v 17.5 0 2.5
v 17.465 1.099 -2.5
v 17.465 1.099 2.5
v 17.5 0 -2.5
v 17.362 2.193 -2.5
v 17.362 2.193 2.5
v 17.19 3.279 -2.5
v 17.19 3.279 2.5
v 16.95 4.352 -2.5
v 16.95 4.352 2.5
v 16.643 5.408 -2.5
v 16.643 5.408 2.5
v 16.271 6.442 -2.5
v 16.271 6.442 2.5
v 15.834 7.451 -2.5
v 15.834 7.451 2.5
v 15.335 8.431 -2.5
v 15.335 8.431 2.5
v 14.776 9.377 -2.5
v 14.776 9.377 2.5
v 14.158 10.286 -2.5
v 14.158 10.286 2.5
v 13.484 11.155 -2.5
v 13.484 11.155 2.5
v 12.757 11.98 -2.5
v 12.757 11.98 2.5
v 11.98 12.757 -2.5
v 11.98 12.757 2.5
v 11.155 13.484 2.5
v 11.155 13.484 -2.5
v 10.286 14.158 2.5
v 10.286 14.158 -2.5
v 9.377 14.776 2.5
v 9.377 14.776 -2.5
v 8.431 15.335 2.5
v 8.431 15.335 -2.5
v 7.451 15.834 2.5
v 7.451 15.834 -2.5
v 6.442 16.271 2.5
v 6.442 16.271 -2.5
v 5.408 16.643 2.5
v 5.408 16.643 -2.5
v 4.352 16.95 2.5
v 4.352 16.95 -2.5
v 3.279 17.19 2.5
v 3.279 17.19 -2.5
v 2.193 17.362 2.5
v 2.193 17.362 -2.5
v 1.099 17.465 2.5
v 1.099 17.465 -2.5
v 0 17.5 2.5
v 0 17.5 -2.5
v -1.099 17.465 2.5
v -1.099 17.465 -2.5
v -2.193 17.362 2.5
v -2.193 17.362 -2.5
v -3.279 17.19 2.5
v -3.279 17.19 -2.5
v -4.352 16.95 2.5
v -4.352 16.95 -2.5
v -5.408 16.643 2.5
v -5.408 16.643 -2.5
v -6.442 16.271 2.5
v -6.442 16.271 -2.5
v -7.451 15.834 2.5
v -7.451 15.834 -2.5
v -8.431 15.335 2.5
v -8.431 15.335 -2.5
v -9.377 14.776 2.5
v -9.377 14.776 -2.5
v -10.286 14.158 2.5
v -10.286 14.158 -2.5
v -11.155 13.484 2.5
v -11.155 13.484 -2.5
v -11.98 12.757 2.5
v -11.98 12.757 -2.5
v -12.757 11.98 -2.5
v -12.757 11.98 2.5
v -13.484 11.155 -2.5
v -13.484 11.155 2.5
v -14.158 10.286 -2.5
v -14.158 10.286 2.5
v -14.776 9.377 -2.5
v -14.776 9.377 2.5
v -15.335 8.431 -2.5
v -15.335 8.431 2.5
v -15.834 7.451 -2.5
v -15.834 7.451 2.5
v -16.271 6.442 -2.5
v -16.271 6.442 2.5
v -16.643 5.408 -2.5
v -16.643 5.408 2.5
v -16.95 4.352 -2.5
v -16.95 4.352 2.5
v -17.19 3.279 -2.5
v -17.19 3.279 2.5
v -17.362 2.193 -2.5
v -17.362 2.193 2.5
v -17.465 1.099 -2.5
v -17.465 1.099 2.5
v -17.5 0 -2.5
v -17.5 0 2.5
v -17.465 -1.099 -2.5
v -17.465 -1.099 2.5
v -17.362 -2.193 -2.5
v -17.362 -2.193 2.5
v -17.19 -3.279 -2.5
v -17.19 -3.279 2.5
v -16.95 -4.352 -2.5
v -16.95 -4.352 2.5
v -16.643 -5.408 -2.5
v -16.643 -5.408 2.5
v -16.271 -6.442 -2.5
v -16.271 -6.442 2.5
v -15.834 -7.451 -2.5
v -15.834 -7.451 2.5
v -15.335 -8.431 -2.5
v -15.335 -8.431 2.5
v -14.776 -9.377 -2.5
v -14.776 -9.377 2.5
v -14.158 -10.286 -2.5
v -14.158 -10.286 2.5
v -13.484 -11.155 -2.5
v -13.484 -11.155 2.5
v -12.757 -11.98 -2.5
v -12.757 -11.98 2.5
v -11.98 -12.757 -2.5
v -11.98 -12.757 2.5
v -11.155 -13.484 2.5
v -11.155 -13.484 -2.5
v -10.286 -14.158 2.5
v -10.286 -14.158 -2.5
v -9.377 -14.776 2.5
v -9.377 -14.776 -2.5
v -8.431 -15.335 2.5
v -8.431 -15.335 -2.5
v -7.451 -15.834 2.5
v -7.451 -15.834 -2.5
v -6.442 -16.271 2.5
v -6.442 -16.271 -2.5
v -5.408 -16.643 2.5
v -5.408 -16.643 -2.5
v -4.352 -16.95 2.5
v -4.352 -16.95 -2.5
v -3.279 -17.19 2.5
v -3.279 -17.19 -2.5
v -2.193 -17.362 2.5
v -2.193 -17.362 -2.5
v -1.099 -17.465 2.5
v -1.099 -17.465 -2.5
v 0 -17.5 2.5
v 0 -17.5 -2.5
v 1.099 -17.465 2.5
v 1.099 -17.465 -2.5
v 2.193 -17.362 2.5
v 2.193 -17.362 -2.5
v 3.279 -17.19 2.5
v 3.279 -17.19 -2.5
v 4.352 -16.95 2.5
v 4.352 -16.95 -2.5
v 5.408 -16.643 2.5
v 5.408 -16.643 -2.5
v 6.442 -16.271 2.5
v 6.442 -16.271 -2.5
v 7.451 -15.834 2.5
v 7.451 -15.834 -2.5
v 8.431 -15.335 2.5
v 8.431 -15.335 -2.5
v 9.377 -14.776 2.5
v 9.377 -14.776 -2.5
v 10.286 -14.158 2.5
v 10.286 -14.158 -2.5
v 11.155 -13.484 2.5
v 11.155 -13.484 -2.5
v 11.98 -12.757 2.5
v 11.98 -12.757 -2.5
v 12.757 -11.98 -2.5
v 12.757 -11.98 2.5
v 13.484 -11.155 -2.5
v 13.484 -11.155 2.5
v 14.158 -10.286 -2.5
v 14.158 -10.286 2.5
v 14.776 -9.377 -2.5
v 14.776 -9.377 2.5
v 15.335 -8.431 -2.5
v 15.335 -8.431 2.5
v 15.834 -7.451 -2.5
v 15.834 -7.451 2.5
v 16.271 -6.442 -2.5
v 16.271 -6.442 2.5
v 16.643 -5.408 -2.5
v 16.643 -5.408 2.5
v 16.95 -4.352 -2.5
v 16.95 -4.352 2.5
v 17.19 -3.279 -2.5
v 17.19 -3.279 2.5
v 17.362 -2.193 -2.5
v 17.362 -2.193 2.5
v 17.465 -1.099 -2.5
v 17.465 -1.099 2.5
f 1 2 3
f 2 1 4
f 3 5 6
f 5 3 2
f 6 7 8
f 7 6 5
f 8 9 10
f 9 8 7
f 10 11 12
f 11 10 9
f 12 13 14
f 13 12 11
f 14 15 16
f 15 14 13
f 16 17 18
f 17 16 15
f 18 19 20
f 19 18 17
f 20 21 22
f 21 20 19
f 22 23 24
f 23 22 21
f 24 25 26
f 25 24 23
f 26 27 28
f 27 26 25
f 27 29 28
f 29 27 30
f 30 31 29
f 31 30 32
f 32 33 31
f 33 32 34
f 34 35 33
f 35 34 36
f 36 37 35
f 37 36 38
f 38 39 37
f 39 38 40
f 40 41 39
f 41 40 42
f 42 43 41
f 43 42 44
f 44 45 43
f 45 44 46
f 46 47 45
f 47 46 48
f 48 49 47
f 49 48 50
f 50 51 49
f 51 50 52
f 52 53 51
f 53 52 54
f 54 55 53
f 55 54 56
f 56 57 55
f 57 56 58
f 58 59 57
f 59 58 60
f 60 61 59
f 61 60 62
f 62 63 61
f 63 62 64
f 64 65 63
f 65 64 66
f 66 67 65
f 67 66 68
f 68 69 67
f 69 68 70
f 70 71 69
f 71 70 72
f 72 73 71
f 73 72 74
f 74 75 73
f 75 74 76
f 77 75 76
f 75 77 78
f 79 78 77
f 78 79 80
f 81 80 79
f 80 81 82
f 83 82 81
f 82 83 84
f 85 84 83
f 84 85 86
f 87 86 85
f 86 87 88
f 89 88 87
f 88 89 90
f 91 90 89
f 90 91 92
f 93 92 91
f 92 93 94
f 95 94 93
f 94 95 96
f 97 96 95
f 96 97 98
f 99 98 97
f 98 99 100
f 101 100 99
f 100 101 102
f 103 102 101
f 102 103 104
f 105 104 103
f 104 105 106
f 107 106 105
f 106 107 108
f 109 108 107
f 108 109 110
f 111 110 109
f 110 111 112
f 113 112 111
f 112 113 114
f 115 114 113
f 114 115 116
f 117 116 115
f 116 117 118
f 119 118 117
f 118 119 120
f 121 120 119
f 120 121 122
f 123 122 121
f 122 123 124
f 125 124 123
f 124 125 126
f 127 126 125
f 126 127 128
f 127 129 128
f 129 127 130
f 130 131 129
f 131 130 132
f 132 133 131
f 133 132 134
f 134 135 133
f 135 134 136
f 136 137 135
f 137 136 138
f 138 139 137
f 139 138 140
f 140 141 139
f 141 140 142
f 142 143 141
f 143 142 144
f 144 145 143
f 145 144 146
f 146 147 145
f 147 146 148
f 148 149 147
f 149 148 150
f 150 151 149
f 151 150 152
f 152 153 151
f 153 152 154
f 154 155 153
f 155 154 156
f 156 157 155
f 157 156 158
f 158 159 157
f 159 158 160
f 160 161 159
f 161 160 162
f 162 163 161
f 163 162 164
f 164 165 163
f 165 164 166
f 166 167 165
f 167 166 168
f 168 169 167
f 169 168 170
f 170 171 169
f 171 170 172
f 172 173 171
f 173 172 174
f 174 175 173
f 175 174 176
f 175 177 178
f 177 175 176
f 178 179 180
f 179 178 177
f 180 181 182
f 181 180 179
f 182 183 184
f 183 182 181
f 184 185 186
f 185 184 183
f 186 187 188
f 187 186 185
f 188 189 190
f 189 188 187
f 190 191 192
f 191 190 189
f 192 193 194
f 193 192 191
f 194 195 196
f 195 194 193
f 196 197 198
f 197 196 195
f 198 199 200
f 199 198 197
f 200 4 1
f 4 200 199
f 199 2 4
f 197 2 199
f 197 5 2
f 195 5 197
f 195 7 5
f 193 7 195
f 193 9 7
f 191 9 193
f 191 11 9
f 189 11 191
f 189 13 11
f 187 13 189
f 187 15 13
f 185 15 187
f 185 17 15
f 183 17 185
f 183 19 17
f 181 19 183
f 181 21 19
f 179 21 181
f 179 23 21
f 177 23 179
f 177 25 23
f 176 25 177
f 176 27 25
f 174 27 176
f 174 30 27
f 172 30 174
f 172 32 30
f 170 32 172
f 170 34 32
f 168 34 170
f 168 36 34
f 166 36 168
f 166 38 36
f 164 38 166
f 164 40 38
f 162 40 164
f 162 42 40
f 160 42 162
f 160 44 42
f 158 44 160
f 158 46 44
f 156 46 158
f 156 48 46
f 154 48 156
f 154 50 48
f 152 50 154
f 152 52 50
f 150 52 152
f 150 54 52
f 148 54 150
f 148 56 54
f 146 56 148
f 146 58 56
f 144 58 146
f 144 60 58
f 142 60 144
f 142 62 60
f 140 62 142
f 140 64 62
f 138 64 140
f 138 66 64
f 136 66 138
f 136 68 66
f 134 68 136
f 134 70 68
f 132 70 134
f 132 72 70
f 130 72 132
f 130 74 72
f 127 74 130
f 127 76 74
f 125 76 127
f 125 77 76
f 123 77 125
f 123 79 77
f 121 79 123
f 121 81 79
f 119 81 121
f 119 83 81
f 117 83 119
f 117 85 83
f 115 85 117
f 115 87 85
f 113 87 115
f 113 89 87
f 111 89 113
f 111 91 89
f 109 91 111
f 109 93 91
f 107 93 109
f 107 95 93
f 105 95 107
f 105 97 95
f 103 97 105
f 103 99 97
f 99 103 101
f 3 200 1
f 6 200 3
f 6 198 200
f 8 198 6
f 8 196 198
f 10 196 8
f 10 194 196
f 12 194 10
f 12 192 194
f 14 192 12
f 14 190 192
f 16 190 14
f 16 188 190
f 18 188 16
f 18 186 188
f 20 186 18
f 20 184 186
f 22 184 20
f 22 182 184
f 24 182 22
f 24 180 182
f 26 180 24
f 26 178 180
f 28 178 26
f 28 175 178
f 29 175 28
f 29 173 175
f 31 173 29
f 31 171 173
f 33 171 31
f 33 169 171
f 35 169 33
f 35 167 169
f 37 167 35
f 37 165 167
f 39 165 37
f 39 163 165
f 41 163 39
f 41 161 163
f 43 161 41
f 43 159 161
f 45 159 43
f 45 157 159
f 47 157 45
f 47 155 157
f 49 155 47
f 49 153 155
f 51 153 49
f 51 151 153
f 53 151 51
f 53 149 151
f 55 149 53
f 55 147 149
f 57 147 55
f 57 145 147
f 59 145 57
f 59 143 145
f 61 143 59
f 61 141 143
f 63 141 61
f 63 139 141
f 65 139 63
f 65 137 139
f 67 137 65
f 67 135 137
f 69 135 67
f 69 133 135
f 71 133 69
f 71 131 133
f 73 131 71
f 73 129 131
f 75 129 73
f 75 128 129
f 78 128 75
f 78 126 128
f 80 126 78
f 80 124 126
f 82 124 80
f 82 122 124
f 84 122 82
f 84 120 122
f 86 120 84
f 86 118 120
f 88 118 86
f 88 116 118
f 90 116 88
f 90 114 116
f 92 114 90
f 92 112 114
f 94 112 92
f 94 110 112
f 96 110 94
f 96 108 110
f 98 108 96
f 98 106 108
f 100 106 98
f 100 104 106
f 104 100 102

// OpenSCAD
// file: 3dprinter.scad
//BioDeploy SCAD file = 3dprinter.scad


//choose the max specs for your 3d printer
//here we use a replicator2x specs

x_print_max = 25*10;
y_print_max = 15.2*10;
z_print_max = 15.5*10;

//don't forget *10 to put in centimeters
// file: generator_variables.scad
//===============================================//
//===============================================//
// BioDeploy SCAD file = generator_variables.scad//
//                 Start File                    //
//===============================================//
//===============================================//
//-----------------------------------------------//
include <3dprinter.scad>
//===============================================//
//                   variables                   //
//===============================================//
//===============================================//
pad = 0.1; //padding
//choose the spec for your generator
//===============================================//
//                    magnets1                   //
//===============================================//
//Volume :
x_magnet = 5.5;
y_magnet = 21.5;
z_magnet = 21.5;
//Number of magnets on the rotor :
nbmagnetsonrotor = 16;
rotor_ext_max = 60;
//===============================================//
//                    magnets2                   //
//===============================================//
//Volume :
diam_magnet2 = 35;
z_magnet2 = 5;
//Number of magnets on the rotor :
nbmagnetsonrotor2 = 6;
//===============================================//
//                      rotor                    //
//===============================================//
smooth_rotor = 100;
smooth_bobine = 100;
z_rotor_int = 20;
//===============================================//
//                  adapter_rotor                //
//===============================================//
diam_adapter_max = 32 ;
diam_adapter_min = 25.15 ;
h_adapter = 7;
h_adapter_box = 12;
nbarm = 6;
//===============================================//
//                    Bobine1                    //
//===============================================//
r_bobine_ext_max = y_magnet/2;
r_bobine_ext_min = 4.5;
r_bobine_int = 3.5;

x_bobine = 30;
p_bobine_ext = 1;

r_bobine2_ext_min = 3.4;
r_bobine2_int = 2.5;

wire_in = 1;
wire_out = 1;


//===============================================//
//                    Protector                  //
//===============================================//

r_bobine_protector_ext_max = y_magnet/2 + 1.5;
gap_bobine_protector = (r_bobine_protector_ext_max - r_bobine_ext_max)/2;


x_bobine_protector=x_bobine+1.5;

smooth_protector = 100;

//===============================================//
//                    Socle1                     //
//===============================================//

r_socle_int = 0;
r_socle_ext = 0;
position_bobine_in = 0;
position_bobine_out = 0;
connector_socle_female =0;
connector_socle_male =0;
space_marge=3;

//-----------------------------------------------//
//===============================================//
//===============================================//
// BioDeploy SCAD file = generator_variables.scad//
//                   End  File                   //
//===============================================//
//===============================================//
// main file
//===============================================//
//===============================================//
//  BioDeploy SCAD file = generator_magnet2.scad  //
//                 Start File                    //
//===============================================//
//===============================================//
//-----------------------------------------------//

//===============================================//
//                   variables                   //
//===============================================//
include <generator_variables.scad>
//===============================================//
//               Calls for use                   //
//===============================================//
//use <generator_logo.scad>
//===============================================//
//                    Trees                      //
//===============================================//
module magnet2()
{color("Rose",1)cylinder(z_magnet2,diam_magnet2/2,diam_magnet2/2,$fn=smooth_rotor, center=true);}
magnet2();

//%cube([x_h2o_cont_ext,y_h2o_cont_ext,z_h2o_cont_ext], center=true);
//-----------------------------------------------//
//===============================================//
//===============================================//
//  BioDeploy SCAD file = generator_magnet2.scad  //
//                   End  File                   //
//===============================================//
//===============================================//
